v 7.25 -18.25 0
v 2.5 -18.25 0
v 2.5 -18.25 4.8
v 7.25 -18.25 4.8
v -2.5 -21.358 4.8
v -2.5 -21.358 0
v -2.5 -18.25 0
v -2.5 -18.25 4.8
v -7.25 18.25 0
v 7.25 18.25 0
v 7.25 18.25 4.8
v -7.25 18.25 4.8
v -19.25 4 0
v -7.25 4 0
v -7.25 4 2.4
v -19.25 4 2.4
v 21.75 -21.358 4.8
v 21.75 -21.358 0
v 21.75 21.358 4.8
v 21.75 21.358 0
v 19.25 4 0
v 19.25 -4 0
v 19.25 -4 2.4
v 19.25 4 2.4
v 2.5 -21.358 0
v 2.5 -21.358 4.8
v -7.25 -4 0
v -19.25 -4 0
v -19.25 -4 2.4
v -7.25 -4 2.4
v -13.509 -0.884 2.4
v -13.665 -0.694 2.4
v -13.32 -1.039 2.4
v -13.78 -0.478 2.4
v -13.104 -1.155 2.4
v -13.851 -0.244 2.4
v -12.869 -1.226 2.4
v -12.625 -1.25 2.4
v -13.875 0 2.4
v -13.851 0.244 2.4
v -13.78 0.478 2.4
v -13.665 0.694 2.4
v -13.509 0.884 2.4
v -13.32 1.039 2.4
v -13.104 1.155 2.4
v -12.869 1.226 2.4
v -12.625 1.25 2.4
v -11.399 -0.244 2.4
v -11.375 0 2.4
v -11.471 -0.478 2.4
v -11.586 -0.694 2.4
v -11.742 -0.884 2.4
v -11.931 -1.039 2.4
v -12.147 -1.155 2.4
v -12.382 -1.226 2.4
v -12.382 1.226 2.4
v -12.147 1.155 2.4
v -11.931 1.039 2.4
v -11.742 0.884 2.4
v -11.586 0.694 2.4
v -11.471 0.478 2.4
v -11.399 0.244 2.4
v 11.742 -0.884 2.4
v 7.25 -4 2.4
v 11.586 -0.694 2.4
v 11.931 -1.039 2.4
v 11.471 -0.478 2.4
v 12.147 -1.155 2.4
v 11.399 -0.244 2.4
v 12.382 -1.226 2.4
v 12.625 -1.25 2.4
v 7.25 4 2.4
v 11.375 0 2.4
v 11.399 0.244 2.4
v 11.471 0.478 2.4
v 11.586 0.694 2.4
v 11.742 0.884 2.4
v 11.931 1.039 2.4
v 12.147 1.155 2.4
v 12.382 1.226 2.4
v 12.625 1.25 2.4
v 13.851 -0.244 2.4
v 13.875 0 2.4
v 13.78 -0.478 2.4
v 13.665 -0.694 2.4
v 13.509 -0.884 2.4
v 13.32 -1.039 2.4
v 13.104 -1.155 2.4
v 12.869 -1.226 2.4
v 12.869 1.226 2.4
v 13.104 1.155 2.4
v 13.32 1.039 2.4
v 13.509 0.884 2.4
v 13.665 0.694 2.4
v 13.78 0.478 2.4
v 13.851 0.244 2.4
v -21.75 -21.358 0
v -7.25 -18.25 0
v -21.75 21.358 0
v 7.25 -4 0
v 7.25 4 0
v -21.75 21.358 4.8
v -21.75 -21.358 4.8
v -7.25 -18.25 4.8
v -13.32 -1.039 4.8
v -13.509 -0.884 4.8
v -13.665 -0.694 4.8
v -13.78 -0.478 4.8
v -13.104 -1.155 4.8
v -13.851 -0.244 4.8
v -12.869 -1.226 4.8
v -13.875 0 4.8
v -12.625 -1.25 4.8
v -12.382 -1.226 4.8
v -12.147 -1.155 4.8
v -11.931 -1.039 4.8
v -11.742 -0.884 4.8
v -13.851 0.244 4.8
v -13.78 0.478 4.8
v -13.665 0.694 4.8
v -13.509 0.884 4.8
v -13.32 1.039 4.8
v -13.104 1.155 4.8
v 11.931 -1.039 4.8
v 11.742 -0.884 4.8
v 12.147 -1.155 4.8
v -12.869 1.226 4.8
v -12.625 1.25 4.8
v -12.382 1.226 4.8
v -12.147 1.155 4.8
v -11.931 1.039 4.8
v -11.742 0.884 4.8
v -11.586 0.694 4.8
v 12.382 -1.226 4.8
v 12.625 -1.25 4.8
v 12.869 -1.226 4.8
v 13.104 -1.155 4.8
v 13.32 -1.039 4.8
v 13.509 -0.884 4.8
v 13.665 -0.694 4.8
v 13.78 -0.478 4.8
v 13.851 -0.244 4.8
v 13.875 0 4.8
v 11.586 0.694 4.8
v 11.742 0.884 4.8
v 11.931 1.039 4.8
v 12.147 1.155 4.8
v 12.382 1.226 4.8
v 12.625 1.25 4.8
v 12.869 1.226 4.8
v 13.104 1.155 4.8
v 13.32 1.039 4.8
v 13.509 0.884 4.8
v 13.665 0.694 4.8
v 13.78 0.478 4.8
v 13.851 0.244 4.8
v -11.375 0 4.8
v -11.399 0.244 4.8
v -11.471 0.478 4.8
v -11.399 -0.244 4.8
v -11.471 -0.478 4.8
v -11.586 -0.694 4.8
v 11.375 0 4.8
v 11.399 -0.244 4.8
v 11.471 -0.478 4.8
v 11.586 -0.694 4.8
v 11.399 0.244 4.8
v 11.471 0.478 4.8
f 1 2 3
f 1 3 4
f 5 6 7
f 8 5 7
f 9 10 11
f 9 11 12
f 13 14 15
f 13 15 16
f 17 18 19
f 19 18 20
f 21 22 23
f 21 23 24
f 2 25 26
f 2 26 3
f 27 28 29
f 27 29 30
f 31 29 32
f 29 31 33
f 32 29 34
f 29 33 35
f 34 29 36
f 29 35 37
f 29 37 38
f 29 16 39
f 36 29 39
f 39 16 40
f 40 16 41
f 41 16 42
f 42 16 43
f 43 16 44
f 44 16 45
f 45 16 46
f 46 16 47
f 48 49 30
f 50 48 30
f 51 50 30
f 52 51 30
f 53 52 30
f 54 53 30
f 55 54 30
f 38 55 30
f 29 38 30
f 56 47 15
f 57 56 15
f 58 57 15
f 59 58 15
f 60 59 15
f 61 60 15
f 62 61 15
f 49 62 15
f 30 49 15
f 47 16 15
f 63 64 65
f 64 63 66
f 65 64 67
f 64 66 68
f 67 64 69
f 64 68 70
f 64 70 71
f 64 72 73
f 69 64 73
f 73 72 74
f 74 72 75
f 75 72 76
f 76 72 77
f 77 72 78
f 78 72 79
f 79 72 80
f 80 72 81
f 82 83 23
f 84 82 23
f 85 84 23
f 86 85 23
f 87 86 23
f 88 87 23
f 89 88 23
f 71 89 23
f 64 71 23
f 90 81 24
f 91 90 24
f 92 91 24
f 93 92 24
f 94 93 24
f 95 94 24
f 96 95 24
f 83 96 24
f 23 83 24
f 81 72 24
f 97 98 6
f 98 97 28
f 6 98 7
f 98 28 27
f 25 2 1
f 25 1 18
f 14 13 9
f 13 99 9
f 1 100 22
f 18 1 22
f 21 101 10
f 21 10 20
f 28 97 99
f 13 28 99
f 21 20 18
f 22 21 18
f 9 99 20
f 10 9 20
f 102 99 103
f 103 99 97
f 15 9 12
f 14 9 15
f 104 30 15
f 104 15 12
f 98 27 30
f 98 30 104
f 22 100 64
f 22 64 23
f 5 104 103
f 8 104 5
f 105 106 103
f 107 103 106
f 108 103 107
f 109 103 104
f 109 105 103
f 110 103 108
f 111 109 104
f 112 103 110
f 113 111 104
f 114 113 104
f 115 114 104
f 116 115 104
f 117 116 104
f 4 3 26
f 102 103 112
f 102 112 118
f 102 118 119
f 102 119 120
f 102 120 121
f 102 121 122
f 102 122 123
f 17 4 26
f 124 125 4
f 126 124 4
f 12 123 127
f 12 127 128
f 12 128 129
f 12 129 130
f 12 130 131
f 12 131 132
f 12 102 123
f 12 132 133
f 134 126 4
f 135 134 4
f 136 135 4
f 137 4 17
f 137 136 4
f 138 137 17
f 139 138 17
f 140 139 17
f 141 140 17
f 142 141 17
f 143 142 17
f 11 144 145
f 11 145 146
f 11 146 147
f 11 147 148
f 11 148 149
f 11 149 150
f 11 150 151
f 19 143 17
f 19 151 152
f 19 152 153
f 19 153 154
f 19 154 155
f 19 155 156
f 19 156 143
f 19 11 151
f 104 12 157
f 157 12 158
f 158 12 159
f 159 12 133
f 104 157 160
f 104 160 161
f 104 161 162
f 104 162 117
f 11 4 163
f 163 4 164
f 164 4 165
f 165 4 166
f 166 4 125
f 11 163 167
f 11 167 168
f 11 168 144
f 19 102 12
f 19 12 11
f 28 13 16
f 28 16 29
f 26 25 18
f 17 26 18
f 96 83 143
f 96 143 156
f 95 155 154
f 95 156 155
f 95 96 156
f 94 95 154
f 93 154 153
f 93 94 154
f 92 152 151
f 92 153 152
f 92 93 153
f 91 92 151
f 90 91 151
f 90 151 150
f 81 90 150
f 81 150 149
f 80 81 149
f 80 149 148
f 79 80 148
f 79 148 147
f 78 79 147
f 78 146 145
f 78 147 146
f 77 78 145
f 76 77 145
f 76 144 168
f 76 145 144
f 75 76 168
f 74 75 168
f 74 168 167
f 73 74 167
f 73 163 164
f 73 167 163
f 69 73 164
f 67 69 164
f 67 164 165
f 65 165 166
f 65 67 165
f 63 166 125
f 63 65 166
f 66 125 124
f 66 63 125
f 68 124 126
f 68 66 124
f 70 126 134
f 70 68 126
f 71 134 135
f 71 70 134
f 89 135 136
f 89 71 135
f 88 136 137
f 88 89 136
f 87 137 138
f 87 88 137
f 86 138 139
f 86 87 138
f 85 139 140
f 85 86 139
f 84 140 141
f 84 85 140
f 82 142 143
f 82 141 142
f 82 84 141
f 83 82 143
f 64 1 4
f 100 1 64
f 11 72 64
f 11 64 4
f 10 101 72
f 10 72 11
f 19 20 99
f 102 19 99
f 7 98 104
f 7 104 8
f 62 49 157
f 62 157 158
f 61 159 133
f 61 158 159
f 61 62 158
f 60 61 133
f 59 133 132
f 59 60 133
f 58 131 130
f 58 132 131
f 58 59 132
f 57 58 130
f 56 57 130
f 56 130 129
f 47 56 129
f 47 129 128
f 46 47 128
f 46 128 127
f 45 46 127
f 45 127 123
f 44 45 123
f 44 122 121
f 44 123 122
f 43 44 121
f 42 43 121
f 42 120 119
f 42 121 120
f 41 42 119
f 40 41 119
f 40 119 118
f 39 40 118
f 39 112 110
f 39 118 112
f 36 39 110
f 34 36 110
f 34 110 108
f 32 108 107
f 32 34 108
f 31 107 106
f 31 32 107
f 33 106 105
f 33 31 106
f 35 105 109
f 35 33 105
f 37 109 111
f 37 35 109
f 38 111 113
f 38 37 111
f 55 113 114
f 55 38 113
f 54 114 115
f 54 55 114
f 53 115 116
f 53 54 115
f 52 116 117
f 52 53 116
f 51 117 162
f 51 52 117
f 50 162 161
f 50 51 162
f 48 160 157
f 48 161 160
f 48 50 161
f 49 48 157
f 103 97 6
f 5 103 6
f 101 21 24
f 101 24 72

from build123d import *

# Parameters (mm, degrees)
BOSS_EXTRUDE1_DEPTH     = 4.8
CUT_EXTRUDE1_DEPTH      = 31.859144724
CUT_EXTRUDE1_DEPTH_BACK = 31.859144724
CUT_EXTRUDE2_DEPTH      = 31.859144724
CUT_EXTRUDE2_DEPTH_BACK = 31.859144724
SKETCH1_13_R            = 1.25
SKETCH1_15_W            = 12
SKETCH1_15_H            = 8
SKETCH1_15_R            = 1.25
CUT_EXTRUDE4_DEPTH      = 2.4
SKETCH2_W               = 5
SKETCH2_H               = 3.108471694
CUT_EXTRUDE5_DEPTH      = 31.859144724


with BuildPart() as part:
    # Sketch1 → Boss-Extrude1 (new body)
    with BuildSketch(Plane.XY):
        Polygon((-21.75, 18.25), (-21.75, -18.25), (-21.75, -21.358471694), (21.75, -21.358471694), (21.75, -18.25), (21.75, 18.25), (21.75, 21.358471694), (-21.75, 21.358471694), align=None)
    extrude(amount=BOSS_EXTRUDE1_DEPTH)

    # Sketch1<12> → Cut-Extrude1 (cut, two sides: drawn at the far end of the back side and taken through both)
    with BuildSketch(Plane.XY.offset(-CUT_EXTRUDE1_DEPTH_BACK)):
        Polygon((-7.25, 18.25), (-7.25, 4), (-7.25, 0), (-7.25, -4), (-7.25, -18.25), (7.25, -18.25), (7.25, -4), (7.25, 0), (7.25, 4), (7.25, 18.25), align=None)
    extrude(amount=CUT_EXTRUDE1_DEPTH + CUT_EXTRUDE1_DEPTH_BACK, mode=Mode.SUBTRACT)

    # Sketch1<13> → Cut-Extrude2 (cut, two sides: drawn at the far end of the back side and taken through both)
    with BuildSketch(Plane.XY.offset(-CUT_EXTRUDE2_DEPTH_BACK)):
        with Locations((-12.625438214, 0)):
            Circle(SKETCH1_13_R)
        with Locations((12.625438214, 0)):
            Circle(SKETCH1_13_R)
    extrude(amount=CUT_EXTRUDE2_DEPTH + CUT_EXTRUDE2_DEPTH_BACK, mode=Mode.SUBTRACT)

    # Sketch1<15> → Cut-Extrude4 (cut)
    # profile 1 of 2: a face of its own
    with BuildSketch(Plane.XY):
        with Locations((-13.25, 0)):
            Rectangle(SKETCH1_15_W, SKETCH1_15_H)
        with Locations((-12.625438214, 0)):
            Circle(SKETCH1_15_R, mode=Mode.SUBTRACT)
    # profile 2 of 2: a face of its own
    with BuildSketch(Plane.XY):
        with Locations((13.25, 0)):
            Rectangle(SKETCH1_15_W, SKETCH1_15_H)
        with Locations((12.625438214, 0)):
            Circle(SKETCH1_15_R, mode=Mode.SUBTRACT)
    extrude(amount=CUT_EXTRUDE4_DEPTH, mode=Mode.SUBTRACT)

    # Sketch2 → Cut-Extrude5 (cut, through all)
    with BuildSketch(Plane(origin=(0, 0, 0), x_dir=(-1, 0, 0), z_dir=(0, 0, -1))):
        with Locations((0, -19.804235847)):
            Rectangle(SKETCH2_W, SKETCH2_H)
    extrude(amount=-CUT_EXTRUDE5_DEPTH, mode=Mode.SUBTRACT)


solid = part.part
